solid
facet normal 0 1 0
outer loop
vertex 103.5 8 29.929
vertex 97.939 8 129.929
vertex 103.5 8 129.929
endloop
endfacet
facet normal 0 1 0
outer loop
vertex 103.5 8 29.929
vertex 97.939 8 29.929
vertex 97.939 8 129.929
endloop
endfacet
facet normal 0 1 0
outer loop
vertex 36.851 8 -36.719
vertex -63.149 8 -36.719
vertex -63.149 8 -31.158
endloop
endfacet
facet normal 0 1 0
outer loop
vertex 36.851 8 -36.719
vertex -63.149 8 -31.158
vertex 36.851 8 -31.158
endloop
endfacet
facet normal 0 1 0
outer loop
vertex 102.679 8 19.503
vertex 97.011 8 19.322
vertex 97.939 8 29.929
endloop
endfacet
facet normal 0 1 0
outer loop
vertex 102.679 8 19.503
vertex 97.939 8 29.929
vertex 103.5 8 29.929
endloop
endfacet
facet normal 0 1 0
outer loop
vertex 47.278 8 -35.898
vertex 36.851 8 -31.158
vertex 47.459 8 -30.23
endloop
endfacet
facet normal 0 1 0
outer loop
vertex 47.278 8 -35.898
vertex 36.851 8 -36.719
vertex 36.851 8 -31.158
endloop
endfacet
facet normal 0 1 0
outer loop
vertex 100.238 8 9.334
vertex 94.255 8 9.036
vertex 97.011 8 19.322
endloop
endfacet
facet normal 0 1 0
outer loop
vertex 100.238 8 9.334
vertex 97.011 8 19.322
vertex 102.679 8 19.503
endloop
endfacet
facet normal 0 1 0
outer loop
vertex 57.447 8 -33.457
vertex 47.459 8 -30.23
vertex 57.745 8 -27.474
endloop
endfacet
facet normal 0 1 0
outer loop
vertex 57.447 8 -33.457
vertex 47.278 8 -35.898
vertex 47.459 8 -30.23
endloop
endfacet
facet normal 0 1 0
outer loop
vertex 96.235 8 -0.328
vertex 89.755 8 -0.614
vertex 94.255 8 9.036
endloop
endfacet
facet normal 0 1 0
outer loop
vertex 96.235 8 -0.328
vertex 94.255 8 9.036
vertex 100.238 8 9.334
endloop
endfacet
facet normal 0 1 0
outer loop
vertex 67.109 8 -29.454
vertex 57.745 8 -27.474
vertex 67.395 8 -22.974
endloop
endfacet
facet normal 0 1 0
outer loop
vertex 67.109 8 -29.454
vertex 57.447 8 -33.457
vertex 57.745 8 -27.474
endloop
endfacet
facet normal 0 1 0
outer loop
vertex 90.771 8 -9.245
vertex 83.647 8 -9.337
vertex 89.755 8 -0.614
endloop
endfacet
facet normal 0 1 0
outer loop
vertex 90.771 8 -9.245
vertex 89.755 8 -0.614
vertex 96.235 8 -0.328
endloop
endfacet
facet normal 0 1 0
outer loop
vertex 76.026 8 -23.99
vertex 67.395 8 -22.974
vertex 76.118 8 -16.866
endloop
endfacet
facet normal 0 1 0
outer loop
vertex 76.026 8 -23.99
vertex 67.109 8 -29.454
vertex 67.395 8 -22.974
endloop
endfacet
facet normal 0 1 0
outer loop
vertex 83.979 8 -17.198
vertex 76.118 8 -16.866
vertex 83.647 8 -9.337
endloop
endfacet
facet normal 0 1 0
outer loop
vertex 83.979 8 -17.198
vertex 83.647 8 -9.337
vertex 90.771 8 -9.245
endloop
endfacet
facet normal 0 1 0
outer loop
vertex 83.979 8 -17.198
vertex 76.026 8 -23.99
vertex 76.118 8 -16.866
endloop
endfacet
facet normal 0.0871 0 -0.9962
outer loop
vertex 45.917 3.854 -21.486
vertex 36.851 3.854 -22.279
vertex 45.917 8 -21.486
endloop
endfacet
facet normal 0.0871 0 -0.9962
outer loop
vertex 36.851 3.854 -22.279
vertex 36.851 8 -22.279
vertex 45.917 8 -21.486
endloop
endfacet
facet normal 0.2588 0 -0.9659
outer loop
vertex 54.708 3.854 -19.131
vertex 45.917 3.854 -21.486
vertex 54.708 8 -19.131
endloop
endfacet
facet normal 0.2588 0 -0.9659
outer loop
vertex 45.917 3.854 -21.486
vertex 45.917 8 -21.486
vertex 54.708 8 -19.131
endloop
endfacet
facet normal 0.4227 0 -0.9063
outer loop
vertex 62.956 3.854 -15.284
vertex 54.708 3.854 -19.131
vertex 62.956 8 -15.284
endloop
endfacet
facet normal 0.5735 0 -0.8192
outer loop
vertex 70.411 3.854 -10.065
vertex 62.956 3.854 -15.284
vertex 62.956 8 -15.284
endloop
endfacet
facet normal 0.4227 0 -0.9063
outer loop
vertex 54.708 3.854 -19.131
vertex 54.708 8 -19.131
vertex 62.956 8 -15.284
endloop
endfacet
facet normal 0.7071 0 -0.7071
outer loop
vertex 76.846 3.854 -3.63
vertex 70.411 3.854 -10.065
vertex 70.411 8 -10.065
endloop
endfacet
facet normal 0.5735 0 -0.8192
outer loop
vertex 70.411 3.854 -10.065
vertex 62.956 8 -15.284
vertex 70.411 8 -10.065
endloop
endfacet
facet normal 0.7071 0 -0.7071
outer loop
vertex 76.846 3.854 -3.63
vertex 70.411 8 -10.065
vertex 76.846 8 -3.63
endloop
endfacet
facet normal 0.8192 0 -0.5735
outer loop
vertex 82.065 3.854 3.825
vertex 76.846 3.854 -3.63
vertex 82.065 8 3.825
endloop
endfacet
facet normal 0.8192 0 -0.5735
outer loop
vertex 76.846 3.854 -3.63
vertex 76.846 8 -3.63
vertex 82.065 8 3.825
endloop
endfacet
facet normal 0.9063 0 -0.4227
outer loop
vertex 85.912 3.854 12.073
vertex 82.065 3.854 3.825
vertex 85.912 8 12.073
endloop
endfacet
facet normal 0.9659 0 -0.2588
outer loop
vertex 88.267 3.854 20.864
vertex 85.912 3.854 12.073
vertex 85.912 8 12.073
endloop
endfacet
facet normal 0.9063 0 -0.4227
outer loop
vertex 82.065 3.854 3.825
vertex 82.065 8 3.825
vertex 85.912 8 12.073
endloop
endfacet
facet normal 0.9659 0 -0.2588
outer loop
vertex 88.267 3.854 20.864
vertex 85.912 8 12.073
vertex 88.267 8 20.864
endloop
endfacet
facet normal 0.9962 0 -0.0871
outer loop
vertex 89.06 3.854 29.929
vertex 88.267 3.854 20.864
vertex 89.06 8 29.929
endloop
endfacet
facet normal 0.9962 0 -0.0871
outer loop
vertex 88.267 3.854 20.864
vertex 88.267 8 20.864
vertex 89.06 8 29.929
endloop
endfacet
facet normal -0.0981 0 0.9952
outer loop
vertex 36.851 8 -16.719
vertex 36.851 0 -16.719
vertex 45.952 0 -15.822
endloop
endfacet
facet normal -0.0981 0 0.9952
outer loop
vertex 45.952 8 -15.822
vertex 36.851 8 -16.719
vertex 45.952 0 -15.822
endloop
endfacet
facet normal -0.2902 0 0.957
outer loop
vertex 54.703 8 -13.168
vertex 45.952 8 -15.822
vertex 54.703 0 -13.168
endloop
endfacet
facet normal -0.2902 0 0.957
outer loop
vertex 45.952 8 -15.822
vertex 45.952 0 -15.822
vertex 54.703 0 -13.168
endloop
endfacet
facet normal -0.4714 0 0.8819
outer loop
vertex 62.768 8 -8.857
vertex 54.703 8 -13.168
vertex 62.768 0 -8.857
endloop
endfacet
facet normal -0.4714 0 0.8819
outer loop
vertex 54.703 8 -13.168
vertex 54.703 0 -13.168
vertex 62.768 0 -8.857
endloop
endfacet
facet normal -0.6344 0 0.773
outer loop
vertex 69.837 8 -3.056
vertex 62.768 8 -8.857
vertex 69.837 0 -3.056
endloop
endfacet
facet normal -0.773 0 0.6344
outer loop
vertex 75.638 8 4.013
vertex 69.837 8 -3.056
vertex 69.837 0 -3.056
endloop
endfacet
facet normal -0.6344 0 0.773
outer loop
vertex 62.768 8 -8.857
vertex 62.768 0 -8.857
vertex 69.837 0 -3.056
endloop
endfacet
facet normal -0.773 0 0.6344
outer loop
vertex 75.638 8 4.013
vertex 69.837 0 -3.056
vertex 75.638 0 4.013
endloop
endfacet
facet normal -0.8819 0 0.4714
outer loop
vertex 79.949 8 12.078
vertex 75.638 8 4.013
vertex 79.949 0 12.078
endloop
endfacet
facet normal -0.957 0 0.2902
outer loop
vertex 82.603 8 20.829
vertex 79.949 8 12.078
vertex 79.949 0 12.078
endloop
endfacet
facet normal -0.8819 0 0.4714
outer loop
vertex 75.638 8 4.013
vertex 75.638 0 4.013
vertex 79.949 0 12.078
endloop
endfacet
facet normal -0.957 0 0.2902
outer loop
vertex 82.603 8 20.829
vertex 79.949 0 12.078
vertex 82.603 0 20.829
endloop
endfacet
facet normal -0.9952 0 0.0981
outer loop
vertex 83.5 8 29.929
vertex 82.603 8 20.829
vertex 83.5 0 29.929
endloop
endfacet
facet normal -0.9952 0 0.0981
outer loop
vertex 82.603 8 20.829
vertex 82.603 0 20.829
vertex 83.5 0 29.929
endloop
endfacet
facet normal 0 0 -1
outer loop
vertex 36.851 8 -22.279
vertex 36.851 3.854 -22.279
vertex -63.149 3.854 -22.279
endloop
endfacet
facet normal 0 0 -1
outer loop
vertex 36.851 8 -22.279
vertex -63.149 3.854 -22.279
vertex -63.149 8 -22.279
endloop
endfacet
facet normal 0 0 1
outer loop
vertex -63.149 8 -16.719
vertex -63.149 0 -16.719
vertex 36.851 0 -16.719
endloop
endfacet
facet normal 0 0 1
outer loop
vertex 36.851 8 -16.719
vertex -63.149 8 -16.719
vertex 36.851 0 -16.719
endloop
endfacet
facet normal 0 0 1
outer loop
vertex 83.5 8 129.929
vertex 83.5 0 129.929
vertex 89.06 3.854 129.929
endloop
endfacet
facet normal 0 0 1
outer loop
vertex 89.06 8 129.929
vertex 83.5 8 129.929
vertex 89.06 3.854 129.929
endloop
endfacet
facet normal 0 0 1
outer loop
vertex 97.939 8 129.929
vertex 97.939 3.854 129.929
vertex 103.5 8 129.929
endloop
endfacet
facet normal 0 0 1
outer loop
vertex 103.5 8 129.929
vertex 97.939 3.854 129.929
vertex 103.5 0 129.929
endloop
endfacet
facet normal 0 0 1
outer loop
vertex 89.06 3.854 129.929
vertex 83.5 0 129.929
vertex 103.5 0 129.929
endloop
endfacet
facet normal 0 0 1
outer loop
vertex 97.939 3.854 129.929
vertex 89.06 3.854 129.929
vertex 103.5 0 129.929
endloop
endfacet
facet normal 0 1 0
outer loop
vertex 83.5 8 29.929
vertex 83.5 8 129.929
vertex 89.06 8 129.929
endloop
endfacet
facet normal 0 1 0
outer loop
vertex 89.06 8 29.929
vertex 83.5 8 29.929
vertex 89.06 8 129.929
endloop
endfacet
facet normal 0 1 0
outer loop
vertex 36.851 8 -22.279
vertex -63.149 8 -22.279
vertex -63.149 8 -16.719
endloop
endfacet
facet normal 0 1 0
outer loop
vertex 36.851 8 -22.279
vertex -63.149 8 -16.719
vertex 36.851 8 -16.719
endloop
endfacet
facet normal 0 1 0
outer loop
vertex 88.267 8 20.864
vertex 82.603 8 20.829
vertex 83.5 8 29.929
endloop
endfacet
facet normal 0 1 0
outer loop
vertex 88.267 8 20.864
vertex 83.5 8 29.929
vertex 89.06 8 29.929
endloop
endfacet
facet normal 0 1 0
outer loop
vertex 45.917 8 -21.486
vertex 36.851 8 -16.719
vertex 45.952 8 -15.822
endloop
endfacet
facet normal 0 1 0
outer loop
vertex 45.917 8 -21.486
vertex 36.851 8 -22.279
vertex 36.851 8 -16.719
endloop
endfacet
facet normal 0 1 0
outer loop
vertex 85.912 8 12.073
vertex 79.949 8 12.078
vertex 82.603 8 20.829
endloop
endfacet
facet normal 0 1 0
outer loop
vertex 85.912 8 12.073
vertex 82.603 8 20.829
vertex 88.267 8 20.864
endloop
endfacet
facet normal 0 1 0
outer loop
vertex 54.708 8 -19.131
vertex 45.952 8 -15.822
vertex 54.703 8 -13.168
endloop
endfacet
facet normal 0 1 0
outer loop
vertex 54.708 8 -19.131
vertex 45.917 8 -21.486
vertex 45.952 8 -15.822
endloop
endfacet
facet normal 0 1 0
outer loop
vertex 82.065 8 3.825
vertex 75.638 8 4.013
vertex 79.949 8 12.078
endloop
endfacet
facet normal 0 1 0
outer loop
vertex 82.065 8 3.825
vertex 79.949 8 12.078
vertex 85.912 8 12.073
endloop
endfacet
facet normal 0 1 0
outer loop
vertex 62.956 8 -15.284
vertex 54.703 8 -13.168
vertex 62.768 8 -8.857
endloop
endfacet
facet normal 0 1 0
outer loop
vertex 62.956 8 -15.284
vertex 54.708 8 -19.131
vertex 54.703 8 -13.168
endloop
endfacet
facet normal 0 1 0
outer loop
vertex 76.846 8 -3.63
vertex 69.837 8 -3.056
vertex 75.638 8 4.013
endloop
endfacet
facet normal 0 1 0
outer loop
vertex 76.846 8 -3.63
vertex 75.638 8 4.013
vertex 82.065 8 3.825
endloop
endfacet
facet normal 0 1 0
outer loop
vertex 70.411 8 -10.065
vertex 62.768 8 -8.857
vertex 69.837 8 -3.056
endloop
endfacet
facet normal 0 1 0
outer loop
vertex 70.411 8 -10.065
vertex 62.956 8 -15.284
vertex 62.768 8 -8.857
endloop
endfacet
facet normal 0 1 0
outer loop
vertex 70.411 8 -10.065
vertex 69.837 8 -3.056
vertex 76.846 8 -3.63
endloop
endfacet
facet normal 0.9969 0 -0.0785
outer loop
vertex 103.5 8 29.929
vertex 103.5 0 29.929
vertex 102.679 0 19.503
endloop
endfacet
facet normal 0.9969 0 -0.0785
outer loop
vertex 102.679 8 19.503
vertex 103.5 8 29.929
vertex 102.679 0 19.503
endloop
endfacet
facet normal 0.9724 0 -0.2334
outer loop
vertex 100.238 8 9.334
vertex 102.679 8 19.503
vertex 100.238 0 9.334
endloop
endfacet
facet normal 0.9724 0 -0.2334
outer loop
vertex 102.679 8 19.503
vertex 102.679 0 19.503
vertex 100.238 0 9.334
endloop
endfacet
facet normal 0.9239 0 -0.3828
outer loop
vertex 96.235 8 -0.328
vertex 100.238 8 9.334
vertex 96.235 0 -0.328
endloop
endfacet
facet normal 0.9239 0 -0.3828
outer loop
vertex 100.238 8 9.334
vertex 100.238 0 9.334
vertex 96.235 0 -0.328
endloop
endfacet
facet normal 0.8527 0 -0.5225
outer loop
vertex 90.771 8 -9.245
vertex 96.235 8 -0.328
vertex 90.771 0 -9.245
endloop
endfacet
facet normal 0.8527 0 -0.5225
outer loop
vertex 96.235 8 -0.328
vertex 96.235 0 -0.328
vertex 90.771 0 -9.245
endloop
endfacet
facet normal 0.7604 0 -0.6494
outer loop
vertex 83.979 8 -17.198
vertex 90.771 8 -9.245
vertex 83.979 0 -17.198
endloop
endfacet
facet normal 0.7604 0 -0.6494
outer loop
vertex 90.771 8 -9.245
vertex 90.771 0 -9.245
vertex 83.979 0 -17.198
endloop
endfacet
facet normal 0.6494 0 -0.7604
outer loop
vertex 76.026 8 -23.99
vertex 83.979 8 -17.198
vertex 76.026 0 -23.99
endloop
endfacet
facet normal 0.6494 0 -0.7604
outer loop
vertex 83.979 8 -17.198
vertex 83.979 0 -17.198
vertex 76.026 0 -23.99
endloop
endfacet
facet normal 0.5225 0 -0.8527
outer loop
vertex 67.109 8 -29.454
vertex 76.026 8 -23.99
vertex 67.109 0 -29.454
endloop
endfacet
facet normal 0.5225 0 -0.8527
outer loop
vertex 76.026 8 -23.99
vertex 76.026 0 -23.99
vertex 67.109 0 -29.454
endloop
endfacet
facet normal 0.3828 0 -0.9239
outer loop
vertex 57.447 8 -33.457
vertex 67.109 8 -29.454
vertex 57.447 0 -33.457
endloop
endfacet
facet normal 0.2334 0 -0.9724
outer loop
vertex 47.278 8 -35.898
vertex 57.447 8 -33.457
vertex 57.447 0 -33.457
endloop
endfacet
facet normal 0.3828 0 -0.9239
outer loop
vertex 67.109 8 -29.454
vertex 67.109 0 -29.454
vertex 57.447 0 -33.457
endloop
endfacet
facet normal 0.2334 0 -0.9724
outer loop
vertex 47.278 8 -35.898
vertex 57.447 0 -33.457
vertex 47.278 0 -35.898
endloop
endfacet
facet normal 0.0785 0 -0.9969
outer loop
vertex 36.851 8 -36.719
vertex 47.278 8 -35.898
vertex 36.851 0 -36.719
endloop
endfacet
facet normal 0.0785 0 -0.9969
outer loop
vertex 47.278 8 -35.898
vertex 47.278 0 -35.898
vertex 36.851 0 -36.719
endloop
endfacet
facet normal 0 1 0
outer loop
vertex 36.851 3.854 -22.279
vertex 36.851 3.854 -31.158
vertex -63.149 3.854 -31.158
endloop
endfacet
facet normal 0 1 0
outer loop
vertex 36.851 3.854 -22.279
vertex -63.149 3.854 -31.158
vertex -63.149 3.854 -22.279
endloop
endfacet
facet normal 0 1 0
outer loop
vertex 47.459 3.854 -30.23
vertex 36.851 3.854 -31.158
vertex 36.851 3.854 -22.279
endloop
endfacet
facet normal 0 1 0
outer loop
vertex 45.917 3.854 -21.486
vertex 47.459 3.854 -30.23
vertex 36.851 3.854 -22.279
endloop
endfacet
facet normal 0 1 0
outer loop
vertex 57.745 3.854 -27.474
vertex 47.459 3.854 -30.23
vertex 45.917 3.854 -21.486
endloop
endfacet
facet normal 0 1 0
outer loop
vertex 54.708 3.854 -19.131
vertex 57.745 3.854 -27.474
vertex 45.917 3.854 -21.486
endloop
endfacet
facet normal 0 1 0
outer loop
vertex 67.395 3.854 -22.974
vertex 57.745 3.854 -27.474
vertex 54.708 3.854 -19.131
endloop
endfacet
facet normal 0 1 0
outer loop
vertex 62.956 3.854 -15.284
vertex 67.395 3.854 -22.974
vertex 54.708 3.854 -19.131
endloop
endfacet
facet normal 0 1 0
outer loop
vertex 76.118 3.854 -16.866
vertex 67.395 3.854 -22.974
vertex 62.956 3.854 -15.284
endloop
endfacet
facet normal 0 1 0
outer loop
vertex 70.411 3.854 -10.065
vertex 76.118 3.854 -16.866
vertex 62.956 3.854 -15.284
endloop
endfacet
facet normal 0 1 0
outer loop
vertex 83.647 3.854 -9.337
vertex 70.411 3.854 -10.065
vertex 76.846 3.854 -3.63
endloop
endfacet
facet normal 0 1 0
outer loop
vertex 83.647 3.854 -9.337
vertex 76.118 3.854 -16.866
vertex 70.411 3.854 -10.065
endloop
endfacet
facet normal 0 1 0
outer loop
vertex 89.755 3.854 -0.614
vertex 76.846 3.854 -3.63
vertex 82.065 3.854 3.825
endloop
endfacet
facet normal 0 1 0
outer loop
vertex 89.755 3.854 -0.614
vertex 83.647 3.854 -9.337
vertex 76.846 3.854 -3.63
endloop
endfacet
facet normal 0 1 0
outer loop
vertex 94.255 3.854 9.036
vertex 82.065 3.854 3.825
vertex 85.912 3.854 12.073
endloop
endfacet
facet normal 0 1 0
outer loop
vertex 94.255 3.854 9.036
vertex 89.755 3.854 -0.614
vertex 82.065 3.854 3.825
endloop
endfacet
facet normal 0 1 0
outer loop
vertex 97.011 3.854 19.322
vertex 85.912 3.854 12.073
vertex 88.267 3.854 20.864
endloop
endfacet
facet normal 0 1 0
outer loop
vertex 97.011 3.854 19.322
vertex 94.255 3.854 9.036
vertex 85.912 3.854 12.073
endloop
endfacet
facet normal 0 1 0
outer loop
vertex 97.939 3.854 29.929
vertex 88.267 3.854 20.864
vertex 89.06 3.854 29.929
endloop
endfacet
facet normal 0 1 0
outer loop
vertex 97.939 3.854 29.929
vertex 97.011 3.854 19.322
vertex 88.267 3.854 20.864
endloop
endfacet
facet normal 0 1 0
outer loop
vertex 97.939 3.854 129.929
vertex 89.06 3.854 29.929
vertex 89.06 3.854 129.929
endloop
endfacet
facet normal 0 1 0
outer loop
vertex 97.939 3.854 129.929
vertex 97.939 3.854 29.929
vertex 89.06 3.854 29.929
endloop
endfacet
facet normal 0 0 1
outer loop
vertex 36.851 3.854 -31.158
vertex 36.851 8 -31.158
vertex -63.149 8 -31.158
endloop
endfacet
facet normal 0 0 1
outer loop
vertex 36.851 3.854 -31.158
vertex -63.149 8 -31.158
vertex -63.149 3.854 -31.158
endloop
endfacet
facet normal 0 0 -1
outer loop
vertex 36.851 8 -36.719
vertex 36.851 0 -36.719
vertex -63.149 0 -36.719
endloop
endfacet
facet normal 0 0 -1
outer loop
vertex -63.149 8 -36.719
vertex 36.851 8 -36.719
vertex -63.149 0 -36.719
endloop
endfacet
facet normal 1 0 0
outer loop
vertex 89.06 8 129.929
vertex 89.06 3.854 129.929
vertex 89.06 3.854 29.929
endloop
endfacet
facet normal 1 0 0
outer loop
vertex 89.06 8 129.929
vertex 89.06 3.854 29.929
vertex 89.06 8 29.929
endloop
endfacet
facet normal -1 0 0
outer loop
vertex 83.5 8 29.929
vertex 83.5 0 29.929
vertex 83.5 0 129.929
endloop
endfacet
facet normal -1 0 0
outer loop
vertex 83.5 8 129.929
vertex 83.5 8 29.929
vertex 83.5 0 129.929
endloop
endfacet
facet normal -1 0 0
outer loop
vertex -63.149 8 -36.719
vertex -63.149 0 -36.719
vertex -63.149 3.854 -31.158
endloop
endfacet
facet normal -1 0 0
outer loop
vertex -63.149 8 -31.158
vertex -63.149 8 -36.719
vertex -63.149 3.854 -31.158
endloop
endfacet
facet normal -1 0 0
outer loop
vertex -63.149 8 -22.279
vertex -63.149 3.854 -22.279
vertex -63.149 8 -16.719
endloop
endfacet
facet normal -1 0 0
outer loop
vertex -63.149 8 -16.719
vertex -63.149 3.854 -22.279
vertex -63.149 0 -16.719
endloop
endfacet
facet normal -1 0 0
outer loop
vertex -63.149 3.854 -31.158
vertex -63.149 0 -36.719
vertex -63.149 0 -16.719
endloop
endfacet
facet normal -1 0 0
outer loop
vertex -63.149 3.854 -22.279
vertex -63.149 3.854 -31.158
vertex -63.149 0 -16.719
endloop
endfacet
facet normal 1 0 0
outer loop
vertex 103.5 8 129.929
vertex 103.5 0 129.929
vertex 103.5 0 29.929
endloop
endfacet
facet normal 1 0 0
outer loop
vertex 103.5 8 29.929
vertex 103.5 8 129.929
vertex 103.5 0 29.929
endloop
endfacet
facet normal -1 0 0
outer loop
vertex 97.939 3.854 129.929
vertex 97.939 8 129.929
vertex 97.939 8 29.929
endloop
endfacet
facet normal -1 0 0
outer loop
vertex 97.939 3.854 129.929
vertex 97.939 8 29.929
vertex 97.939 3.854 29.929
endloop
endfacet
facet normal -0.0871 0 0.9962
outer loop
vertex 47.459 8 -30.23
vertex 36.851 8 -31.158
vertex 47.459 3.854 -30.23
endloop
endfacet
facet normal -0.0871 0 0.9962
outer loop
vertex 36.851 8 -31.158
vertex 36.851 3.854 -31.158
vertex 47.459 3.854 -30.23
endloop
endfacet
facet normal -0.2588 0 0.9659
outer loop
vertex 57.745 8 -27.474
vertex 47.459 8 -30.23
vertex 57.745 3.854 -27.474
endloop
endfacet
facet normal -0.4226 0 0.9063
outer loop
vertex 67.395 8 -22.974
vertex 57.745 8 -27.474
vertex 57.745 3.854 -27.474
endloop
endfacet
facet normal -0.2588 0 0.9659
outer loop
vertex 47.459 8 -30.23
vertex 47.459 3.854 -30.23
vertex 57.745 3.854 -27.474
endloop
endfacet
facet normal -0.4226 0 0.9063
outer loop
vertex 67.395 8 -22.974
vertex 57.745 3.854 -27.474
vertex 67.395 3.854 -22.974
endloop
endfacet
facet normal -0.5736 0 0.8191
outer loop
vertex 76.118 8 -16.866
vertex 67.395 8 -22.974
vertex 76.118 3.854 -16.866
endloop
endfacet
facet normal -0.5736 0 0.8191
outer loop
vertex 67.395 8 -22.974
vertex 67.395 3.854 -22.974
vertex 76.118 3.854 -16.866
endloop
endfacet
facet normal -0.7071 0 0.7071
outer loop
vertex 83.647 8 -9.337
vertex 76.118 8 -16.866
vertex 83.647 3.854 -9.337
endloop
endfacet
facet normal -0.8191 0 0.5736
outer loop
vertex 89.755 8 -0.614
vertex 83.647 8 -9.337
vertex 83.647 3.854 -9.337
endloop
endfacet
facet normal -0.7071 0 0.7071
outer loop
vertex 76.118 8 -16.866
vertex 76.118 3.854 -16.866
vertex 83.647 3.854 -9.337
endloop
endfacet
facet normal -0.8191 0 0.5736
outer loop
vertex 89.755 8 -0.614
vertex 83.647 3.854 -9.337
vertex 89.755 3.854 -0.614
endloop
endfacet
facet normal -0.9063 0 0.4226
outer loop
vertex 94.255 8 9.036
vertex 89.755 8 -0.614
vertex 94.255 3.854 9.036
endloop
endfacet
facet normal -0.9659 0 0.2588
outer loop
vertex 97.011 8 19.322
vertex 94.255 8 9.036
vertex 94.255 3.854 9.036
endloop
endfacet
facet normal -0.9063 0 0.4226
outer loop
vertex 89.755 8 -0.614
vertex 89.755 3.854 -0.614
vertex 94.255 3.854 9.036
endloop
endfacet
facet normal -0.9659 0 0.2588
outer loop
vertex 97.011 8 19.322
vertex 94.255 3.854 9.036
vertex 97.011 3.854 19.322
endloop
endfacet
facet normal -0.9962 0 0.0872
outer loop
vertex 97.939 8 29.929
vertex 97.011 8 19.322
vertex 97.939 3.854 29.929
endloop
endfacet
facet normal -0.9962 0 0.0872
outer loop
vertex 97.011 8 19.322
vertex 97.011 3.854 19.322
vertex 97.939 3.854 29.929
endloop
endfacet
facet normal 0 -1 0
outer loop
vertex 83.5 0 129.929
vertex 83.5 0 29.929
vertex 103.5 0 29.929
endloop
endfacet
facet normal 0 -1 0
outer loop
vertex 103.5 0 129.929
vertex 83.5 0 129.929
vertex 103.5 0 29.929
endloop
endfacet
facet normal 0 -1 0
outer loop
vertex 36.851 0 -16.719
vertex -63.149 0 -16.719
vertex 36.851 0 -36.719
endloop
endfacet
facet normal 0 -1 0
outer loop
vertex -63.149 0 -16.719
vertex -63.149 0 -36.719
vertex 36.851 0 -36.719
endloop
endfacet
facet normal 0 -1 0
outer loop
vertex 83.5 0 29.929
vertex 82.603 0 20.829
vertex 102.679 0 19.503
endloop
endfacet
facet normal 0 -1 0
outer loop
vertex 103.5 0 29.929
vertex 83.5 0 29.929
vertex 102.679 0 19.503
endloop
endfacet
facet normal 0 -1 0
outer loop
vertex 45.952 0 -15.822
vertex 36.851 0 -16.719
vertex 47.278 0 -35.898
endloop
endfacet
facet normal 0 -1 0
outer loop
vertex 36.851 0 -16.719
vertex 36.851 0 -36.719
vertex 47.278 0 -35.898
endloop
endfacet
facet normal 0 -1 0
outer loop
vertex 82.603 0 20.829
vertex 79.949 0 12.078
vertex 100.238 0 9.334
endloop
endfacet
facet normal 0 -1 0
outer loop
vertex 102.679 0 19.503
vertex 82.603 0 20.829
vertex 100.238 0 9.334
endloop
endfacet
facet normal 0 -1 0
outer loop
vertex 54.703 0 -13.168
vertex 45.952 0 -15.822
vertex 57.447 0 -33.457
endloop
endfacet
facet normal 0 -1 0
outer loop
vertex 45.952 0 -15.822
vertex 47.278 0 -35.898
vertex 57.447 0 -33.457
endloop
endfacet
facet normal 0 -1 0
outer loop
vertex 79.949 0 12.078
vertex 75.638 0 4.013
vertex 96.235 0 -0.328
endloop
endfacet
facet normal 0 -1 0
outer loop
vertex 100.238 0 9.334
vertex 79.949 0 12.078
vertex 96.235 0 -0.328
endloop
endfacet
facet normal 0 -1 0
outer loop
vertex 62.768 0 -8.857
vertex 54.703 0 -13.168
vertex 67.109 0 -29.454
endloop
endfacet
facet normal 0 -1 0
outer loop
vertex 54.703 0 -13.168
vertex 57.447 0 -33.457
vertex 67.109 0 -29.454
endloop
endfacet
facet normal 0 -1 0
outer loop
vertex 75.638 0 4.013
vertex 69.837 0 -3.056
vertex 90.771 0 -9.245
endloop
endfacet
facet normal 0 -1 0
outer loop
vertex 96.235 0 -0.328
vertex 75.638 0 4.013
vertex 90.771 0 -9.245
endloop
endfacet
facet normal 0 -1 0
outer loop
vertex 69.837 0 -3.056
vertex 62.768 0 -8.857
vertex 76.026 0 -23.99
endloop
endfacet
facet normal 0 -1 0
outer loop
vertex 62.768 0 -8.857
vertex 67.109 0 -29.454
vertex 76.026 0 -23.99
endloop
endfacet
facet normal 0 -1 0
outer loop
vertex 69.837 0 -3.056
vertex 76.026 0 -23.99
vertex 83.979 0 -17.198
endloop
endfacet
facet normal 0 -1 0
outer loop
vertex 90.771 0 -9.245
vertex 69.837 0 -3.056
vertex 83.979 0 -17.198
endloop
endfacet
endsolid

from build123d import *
from OCP.BRepAlgoAPI import BRepAlgoAPI_Cut
from OCP.TopTools import TopTools_ListOfShape

# Parameters (mm, degrees)
BOSS_EXTRUDE1_DEPTH = 8
SKETCH3_W           = 8.879033142
SKETCH3_H           = 4.145705198


with BuildPart() as part:
    # Sketch1 → Boss-Extrude1 (new body)
    with BuildSketch(Plane(origin=(0, 0, 0), x_dir=(1, 0, 0), z_dir=(0, 1, 0))):
        with BuildLine():
            Line((-63.148507742, 16.718633156), (36.851492258, 16.718633156))
            ThreePointArc((36.851492258, 16.718633156), (69.836689376, 3.055714409), (83.499598758, -29.92948659))
            Line((83.499598758, -29.92948659), (83.499598758, -129.929492269))
            Line((83.499598758, -129.929492269), (103.499598758, -129.929492269))
            Line((103.499598758, -129.929492269), (103.499598758, -29.929492269))
            ThreePointArc((103.499598758, -29.929492269), (83.978827008, 17.197848025), (36.851492258, 36.718633156))
            Line((36.851492258, 36.718633156), (-63.148507742, 36.718633156))
            Line((-63.148507742, 36.718633156), (-63.148507742, 16.718633156))
        make_face()
    extrude(amount=BOSS_EXTRUDE1_DEPTH)


with BuildPart() as cut_sweep1_tool:
    # Cut-Sweep1: sweep along a path in Sketch2
    with BuildLine(Plane(origin=(0, 8, 0), x_dir=(1, 0, 0), z_dir=(0, 1, 0))) as cut_sweep1_path:
        Line((-63.148507742, 26.718633156), (36.851492258, 26.718633156))
        ThreePointArc((36.851492258, 26.718633156), (76.907758192, 10.126781217), (93.499598758, -29.929489429))
        Line((93.499598758, -29.929489429), (93.499598758, -129.929492269))
    # Sketch3 → Cut-Sweep1 (sweep)
    with BuildSketch(Plane.ZY.offset(63.148507742)):
        with Locations((-26.718633156, 5.927147401)):
            Rectangle(SKETCH3_W, SKETCH3_H)
    sweep(path=cut_sweep1_path.line)


with BuildPart() as part_1:
    add(part.part)

    # Cut-Sweep1: cut by cut_sweep1_tool, with a tolerance
    cut_sweep1_stock = TopTools_ListOfShape()
    cut_sweep1_stock.Append(part_1.part.wrapped)
    cut_sweep1_tools = TopTools_ListOfShape()
    cut_sweep1_tools.Append(cut_sweep1_tool.part.wrapped)
    cut_sweep1_cut = BRepAlgoAPI_Cut()
    cut_sweep1_cut.SetArguments(cut_sweep1_stock)
    cut_sweep1_cut.SetTools(cut_sweep1_tools)
    cut_sweep1_cut.SetFuzzyValue(0.00001)
    cut_sweep1_cut.Build()
    add(Compound.cast(cut_sweep1_cut.Shape()).solids(), mode=Mode.REPLACE)


solid = part_1.part
